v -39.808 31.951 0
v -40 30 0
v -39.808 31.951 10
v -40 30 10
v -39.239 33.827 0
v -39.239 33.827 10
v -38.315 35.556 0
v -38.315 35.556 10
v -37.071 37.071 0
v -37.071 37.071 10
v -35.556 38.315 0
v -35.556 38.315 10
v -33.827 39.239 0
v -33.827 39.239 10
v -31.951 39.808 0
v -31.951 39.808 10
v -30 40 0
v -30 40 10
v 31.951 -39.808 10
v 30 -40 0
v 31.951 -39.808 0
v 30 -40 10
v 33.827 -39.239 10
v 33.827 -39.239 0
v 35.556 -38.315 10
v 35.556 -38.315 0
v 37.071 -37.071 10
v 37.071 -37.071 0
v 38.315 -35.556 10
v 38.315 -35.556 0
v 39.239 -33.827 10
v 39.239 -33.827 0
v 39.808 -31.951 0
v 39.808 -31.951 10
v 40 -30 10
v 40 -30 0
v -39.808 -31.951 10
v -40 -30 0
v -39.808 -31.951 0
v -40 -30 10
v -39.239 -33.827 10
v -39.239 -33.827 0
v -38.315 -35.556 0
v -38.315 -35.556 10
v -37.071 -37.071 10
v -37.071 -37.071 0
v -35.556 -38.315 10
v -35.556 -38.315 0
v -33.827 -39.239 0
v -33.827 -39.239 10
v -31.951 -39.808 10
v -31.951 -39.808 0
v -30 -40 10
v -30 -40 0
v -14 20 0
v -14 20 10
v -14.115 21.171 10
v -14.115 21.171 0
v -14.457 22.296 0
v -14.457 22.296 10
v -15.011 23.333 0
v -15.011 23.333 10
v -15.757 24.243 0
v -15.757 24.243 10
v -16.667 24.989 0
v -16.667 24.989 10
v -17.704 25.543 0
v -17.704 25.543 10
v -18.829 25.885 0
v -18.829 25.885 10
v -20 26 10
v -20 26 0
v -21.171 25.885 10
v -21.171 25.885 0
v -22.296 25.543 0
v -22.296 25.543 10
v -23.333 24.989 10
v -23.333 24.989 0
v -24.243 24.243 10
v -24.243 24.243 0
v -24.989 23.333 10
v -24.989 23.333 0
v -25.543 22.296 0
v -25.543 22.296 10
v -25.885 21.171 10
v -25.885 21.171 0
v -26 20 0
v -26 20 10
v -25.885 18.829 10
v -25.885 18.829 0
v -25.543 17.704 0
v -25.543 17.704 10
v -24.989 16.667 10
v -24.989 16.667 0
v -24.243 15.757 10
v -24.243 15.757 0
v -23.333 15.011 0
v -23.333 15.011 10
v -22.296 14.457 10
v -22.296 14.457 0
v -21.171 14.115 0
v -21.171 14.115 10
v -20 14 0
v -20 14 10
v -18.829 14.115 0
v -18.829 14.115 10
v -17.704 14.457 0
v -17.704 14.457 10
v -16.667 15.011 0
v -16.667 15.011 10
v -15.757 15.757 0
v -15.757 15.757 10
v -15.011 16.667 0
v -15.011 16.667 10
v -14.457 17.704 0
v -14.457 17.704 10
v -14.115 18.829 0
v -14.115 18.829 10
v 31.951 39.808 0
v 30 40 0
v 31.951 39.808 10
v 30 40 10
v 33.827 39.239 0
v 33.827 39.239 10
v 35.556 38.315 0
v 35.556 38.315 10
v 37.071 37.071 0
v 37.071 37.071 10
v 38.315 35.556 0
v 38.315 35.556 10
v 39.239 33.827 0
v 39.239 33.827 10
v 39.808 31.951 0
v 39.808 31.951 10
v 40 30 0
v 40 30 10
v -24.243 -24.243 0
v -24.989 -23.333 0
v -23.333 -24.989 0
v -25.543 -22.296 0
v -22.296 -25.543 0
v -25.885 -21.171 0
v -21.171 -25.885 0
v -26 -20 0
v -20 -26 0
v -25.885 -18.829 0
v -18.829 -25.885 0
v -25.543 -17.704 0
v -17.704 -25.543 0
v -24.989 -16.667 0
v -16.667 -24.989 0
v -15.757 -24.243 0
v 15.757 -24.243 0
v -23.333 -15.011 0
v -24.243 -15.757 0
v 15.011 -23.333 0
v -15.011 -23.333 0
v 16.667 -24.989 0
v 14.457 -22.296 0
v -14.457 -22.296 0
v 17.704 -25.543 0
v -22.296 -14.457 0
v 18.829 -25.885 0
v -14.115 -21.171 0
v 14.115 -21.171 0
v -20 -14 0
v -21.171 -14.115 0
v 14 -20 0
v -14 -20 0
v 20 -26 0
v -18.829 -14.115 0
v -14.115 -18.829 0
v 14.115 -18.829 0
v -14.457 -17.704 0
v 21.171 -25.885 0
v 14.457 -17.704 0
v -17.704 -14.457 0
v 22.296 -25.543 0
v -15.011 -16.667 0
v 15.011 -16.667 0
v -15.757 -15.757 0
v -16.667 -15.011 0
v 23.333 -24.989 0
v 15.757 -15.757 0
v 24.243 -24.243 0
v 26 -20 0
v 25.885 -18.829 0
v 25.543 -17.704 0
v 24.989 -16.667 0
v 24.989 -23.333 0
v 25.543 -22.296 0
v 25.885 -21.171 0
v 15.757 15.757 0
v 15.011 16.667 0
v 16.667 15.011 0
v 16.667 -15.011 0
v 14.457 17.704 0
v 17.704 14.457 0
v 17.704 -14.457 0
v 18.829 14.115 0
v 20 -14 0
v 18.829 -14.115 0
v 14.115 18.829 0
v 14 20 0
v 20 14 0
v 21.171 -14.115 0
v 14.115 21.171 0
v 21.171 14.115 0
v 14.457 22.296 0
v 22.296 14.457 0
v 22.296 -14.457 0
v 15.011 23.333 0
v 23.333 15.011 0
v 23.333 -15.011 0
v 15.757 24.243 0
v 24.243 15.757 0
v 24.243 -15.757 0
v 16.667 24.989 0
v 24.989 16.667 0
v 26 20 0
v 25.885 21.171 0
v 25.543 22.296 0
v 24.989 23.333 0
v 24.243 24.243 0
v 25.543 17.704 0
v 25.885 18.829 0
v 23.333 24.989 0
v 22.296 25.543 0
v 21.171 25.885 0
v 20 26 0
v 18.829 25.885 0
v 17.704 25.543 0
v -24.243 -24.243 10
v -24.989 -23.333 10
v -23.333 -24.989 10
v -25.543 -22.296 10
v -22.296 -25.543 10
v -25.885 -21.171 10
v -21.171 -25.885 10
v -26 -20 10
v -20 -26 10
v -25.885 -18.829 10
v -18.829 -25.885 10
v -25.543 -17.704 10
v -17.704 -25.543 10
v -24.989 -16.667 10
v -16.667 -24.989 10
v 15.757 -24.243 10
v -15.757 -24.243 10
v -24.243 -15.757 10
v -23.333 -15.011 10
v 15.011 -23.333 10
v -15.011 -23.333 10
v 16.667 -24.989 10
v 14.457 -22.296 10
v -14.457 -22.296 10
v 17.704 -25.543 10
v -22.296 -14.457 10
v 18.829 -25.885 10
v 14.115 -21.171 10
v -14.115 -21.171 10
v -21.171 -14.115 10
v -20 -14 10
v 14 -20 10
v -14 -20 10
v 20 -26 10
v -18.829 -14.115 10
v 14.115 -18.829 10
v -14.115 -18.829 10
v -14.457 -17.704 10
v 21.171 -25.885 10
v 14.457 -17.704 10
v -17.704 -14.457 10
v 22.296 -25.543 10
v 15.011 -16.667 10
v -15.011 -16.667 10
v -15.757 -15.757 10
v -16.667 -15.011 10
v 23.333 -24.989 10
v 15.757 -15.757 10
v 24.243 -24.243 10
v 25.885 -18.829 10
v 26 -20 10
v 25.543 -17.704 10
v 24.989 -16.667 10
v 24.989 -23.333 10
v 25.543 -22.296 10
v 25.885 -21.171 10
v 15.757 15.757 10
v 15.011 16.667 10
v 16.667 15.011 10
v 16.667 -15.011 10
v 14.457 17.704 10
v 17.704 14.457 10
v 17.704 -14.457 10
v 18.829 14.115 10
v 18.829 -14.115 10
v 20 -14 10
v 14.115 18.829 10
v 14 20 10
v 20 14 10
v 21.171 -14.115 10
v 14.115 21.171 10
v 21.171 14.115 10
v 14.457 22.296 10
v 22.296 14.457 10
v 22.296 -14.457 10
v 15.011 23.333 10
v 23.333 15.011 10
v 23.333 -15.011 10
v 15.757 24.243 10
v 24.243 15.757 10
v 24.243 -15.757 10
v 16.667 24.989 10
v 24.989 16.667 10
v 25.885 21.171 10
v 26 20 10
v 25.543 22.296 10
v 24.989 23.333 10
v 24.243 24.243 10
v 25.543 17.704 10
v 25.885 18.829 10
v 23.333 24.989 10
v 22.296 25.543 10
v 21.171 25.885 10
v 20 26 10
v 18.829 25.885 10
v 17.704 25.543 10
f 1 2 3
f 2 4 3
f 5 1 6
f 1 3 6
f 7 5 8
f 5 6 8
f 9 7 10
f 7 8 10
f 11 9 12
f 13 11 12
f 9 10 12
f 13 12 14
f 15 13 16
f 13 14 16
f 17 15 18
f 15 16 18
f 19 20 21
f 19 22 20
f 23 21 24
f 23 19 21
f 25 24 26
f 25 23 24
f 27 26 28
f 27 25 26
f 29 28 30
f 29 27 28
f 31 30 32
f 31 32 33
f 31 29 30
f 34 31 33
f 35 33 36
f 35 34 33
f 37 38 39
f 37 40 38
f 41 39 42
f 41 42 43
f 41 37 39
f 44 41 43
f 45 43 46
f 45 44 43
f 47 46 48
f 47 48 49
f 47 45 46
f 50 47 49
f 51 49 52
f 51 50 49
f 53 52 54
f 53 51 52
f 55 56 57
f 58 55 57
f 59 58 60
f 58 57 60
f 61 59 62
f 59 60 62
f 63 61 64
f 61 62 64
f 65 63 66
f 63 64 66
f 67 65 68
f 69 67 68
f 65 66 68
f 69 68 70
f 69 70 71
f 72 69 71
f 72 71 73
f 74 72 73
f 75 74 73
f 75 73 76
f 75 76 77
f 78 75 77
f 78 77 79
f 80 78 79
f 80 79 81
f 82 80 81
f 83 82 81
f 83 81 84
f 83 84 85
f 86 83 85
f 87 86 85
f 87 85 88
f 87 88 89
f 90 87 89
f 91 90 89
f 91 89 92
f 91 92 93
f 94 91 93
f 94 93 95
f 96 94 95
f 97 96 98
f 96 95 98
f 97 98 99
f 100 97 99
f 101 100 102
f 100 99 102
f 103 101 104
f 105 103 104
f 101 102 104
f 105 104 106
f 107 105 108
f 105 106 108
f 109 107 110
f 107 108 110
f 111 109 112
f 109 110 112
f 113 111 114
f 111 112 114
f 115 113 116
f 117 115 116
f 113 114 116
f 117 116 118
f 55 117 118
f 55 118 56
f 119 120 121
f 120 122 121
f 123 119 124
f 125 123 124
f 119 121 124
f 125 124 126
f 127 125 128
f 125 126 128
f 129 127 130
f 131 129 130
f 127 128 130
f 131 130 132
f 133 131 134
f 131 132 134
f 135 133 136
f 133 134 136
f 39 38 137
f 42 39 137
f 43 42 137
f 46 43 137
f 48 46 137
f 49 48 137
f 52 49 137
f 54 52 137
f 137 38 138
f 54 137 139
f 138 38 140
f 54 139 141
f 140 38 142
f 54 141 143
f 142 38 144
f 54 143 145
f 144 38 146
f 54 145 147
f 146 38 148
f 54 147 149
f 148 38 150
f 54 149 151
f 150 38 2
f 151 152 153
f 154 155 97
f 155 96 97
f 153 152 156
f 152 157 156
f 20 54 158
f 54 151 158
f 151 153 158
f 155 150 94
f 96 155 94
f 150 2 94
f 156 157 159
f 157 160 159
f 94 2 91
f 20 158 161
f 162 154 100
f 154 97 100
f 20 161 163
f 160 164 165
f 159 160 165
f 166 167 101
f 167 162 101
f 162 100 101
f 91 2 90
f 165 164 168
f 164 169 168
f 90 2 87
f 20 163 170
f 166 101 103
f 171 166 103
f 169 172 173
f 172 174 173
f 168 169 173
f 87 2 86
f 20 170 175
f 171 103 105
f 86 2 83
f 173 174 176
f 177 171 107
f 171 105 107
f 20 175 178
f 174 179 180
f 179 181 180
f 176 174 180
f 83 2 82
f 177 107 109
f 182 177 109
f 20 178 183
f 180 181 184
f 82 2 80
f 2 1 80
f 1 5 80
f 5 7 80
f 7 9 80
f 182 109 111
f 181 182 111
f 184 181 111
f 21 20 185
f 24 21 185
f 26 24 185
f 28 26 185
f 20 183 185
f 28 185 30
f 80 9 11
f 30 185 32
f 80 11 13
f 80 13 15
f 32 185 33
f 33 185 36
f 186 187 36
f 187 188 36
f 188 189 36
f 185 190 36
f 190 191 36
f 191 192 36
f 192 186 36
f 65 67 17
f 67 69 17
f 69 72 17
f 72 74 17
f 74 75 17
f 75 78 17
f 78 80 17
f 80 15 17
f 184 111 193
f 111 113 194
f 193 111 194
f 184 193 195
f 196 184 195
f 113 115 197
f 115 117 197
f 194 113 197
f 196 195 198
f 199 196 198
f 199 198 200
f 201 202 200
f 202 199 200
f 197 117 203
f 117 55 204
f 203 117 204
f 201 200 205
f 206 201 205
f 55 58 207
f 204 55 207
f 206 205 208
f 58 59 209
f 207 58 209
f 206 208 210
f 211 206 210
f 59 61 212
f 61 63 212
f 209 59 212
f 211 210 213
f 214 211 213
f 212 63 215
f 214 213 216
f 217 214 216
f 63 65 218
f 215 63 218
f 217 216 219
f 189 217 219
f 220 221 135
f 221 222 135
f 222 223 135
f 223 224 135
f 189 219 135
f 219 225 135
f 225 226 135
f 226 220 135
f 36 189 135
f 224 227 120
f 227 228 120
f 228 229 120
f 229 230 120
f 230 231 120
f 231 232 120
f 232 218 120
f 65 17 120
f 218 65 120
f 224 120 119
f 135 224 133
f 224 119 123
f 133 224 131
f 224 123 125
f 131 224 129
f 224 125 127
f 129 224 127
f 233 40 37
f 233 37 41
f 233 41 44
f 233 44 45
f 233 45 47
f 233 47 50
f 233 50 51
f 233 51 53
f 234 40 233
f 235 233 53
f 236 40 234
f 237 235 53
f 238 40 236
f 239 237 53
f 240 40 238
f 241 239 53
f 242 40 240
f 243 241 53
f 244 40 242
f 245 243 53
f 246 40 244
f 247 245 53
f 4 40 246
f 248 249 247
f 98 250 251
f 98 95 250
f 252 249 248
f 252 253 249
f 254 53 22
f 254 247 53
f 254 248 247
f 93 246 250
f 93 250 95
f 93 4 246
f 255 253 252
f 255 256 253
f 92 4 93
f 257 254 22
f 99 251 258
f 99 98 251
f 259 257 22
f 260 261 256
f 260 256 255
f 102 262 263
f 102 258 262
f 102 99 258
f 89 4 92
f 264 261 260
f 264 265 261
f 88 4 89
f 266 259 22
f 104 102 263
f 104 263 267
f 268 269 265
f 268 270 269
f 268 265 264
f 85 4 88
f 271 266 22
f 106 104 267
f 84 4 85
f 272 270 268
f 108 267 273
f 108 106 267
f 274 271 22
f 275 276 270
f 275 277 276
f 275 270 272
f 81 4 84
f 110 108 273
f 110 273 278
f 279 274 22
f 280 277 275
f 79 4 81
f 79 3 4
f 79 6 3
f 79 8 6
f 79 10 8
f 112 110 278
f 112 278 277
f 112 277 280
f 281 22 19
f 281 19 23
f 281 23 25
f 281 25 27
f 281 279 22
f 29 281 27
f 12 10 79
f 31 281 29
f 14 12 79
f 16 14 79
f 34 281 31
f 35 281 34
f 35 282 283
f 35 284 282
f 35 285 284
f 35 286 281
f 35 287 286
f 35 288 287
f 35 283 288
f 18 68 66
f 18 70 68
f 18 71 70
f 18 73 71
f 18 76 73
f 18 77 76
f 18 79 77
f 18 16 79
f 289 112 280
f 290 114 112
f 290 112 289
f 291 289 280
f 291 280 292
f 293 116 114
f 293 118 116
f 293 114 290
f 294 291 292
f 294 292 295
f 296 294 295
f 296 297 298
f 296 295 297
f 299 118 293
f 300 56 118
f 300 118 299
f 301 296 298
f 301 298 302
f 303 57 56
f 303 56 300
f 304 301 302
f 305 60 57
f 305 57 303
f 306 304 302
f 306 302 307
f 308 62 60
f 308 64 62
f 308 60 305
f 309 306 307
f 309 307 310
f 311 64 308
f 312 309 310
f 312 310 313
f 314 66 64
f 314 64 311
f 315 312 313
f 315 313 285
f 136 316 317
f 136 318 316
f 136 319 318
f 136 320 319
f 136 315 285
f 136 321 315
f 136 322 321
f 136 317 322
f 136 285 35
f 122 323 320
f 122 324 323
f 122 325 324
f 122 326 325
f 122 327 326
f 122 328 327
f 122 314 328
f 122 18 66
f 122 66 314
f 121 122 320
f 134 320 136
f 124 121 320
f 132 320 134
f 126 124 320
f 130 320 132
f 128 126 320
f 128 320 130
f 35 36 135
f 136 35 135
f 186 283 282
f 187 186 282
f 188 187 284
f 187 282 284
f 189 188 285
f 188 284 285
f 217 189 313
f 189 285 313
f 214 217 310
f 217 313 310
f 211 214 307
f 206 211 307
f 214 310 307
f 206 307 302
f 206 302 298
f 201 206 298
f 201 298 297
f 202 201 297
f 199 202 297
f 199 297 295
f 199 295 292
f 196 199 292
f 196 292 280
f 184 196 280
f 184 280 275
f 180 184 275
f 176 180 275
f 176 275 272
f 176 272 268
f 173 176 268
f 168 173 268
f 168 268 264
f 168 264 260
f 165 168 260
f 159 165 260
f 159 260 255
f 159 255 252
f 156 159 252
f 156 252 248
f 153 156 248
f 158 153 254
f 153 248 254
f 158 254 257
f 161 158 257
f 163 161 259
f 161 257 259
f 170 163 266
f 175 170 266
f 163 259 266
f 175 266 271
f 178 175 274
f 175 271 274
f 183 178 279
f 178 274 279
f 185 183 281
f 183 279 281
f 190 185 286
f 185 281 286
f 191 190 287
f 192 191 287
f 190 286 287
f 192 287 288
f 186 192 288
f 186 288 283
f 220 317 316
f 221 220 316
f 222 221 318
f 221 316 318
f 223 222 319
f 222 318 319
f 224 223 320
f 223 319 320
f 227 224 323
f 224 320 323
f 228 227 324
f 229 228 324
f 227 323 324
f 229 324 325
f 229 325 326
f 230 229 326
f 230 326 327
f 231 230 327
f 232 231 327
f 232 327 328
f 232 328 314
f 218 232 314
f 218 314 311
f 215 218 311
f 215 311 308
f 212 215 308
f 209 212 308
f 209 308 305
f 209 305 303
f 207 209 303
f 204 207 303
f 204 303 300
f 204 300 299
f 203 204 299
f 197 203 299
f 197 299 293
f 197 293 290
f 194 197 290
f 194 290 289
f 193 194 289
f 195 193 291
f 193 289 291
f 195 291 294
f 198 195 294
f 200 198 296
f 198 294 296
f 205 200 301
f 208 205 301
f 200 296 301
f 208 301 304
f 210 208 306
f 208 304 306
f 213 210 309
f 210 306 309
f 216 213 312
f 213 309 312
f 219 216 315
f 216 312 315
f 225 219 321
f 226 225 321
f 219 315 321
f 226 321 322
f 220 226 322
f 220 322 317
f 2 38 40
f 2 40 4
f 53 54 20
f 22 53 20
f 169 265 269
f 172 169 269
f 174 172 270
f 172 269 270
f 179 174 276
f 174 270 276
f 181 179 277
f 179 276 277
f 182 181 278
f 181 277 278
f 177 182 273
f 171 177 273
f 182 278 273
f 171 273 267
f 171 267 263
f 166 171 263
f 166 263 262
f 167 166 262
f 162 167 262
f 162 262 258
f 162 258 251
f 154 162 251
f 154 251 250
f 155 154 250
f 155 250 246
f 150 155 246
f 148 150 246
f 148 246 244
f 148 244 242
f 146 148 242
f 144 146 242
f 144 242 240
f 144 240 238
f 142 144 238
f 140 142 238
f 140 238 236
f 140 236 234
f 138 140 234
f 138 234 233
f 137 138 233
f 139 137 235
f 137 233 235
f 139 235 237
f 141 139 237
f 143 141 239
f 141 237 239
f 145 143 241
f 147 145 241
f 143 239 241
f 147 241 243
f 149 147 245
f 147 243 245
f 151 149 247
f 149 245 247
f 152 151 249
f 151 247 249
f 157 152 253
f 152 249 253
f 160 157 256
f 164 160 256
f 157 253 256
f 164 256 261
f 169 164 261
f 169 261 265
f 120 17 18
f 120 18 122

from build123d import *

# Parameters (mm, degrees)
SKETCH_W     = 80
SKETCH_H     = 80
PAD_DEPTH    = 10
SKETCH001_R  = 6
POCKET_DEPTH = 10.001
FILLET_R     = 10


with BuildPart() as part:
    # Sketch → Pad (new body)
    with BuildSketch(Plane.XY):
        Rectangle(SKETCH_W, SKETCH_H)
    extrude(amount=PAD_DEPTH)

    # Sketch001 (on Face6 of Pad) → Pocket (cut, through all)
    with BuildSketch(Plane.XY.offset(10)):
        with Locations((-20, 20)):
            Circle(SKETCH001_R)
        with Locations((20, 20)):
            Circle(SKETCH001_R)
        with Locations((20, -20)):
            Circle(SKETCH001_R)
        with Locations((-20, -20)):
            Circle(SKETCH001_R)
    extrude(amount=-POCKET_DEPTH, mode=Mode.SUBTRACT)

    # Fillet
    fillet_edges = [part.edges().sort_by_distance(p)[0] for p in [
        (-40, -40, 5),
        (40, -40, 5),
        (40, 40, 5),
        (-40, 40, 5),
    ]]
    fillet(fillet_edges, radius=FILLET_R)


solid = part.part
